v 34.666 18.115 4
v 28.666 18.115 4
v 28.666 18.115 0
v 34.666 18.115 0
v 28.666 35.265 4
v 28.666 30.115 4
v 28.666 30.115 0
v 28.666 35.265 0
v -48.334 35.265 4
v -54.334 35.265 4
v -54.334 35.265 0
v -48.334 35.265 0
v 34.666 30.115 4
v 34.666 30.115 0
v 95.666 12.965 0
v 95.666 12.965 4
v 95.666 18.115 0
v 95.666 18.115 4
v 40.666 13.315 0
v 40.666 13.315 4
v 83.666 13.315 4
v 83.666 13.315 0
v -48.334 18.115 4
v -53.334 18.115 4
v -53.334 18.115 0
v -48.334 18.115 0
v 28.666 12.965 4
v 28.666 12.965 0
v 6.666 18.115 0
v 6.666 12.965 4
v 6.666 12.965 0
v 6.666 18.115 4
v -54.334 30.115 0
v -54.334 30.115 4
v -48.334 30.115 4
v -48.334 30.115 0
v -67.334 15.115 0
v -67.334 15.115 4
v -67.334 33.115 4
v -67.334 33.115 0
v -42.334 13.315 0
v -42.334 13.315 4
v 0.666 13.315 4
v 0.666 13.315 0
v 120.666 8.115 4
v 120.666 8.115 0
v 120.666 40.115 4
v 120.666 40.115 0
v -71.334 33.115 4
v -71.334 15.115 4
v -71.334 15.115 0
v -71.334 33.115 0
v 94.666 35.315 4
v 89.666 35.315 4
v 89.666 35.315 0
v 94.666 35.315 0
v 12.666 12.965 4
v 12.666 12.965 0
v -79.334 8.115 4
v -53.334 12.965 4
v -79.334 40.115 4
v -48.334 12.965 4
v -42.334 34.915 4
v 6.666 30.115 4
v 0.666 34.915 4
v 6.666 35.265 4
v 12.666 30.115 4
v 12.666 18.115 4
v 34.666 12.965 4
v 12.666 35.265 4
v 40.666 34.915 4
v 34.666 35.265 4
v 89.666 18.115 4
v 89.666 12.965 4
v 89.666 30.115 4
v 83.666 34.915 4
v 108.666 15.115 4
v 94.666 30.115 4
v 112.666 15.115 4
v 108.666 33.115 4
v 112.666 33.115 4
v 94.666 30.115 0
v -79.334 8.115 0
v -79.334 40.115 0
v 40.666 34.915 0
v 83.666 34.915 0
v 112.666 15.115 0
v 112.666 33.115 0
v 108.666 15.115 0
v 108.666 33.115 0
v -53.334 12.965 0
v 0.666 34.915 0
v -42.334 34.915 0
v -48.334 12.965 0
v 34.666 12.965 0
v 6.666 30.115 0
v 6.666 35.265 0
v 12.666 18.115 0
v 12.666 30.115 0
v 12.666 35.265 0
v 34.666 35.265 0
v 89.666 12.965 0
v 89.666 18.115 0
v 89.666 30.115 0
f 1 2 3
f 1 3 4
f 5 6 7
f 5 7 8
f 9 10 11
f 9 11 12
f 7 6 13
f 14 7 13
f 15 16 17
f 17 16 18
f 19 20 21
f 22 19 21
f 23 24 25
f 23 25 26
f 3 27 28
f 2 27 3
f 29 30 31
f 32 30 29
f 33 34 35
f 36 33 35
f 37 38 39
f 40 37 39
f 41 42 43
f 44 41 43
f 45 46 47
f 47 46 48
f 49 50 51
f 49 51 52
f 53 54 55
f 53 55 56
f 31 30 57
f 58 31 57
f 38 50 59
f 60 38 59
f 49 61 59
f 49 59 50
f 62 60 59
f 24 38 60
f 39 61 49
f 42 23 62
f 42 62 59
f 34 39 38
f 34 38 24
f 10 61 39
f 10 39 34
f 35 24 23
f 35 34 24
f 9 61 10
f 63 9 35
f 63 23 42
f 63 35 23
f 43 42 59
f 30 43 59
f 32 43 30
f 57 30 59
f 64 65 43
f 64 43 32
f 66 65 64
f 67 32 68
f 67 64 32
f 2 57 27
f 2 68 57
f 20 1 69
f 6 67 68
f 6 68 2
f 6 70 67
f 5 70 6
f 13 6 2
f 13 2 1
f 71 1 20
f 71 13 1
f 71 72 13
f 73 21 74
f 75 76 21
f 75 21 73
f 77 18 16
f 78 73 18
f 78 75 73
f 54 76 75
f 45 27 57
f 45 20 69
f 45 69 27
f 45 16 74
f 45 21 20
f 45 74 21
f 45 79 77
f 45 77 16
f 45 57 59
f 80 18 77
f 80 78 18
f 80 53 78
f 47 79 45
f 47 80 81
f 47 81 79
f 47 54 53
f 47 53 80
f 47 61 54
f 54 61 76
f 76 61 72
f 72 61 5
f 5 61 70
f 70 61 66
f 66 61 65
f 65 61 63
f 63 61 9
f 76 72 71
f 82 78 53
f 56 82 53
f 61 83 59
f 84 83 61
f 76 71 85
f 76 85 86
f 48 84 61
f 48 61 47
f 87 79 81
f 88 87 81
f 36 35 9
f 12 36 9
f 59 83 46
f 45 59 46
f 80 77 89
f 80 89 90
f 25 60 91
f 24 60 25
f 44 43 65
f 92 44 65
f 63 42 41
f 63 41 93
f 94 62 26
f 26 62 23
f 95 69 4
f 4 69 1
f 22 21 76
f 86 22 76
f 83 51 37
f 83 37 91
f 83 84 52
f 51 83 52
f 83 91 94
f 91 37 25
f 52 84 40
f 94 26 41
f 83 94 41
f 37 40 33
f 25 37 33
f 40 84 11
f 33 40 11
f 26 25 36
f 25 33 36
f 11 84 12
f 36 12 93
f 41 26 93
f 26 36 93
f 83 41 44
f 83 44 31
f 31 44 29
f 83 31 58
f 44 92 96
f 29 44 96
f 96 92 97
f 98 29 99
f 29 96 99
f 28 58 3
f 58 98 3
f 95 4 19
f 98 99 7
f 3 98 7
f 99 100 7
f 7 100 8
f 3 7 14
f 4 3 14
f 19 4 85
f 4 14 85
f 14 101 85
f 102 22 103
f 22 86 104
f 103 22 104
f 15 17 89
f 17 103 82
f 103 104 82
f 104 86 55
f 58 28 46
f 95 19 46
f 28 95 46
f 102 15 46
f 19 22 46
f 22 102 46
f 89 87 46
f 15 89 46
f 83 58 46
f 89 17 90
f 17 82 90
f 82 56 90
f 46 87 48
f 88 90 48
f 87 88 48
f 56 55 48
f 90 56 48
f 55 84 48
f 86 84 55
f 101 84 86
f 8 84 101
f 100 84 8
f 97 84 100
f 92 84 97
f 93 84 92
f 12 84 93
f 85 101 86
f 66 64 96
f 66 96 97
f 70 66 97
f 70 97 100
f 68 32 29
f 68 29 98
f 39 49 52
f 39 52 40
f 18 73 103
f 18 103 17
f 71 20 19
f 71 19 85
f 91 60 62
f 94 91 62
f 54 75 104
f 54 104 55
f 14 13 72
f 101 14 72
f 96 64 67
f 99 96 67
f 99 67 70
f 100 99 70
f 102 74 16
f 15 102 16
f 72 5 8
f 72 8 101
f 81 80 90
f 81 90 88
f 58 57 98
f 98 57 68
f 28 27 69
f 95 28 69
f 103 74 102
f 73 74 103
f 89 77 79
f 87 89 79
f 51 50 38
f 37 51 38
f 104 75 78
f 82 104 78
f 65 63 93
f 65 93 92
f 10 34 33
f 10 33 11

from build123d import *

# Parameters (mm, degrees)
SKETCH2_W           = 200
SKETCH2_H           = 32
BOSS_EXTRUDE1_DEPTH = 4
SKETCH3_W           = 43
SKETCH3_H           = 21.6
SKETCH3_W_2         = 6
SKETCH3_H_2         = 5.15
SKETCH3_W_3         = 5
SKETCH3_W_4         = 4
SKETCH3_H_3         = 18
SKETCH3_H_4         = 5.2
CUT_EXTRUDE1_DEPTH  = 4


with BuildPart() as part:
    # Sketch2 → Boss-Extrude1 (new body)
    with BuildSketch(Plane.XY):
        with Locations((20.66568498, 24.11539075)):
            Rectangle(SKETCH2_W, SKETCH2_H)
    extrude(amount=BOSS_EXTRUDE1_DEPTH)

    # Sketch3 → Cut-Extrude1 (cut)
    with BuildSketch(Plane.XY.offset(4)):
        with Locations((-20.83431502, 24.11539075)):
            Rectangle(SKETCH3_W, SKETCH3_H)
        with Locations((62.16568498, 24.11539075)):
            Rectangle(SKETCH3_W, SKETCH3_H)
        with Locations((31.66568498, 32.69039075)):
            Rectangle(SKETCH3_W_2, SKETCH3_H_2)
        with Locations((-51.33431502, 32.69039075)):
            Rectangle(SKETCH3_W_2, SKETCH3_H_2)
        with Locations((-50.83431502, 15.54039075)):
            Rectangle(SKETCH3_W_3, SKETCH3_H_2)
        with Locations((9.66568498, 32.69039075)):
            Rectangle(SKETCH3_W_2, SKETCH3_H_2)
        with Locations((9.66568498, 15.54039075)):
            Rectangle(SKETCH3_W_2, SKETCH3_H_2)
        with Locations((-69.33431502, 24.11539075)):
            Rectangle(SKETCH3_W_4, SKETCH3_H_3)
        with Locations((31.66568498, 15.54039075)):
            Rectangle(SKETCH3_W_2, SKETCH3_H_2)
        with Locations((92.16568498, 32.71539075)):
            Rectangle(SKETCH3_W_3, SKETCH3_H_4)
        with Locations((92.66568498, 15.54039075)):
            Rectangle(SKETCH3_W_2, SKETCH3_H_2)
        with Locations((110.66568498, 24.11539075)):
            Rectangle(SKETCH3_W_4, SKETCH3_H_3)
    extrude(amount=-CUT_EXTRUDE1_DEPTH, mode=Mode.SUBTRACT)


solid = part.part
